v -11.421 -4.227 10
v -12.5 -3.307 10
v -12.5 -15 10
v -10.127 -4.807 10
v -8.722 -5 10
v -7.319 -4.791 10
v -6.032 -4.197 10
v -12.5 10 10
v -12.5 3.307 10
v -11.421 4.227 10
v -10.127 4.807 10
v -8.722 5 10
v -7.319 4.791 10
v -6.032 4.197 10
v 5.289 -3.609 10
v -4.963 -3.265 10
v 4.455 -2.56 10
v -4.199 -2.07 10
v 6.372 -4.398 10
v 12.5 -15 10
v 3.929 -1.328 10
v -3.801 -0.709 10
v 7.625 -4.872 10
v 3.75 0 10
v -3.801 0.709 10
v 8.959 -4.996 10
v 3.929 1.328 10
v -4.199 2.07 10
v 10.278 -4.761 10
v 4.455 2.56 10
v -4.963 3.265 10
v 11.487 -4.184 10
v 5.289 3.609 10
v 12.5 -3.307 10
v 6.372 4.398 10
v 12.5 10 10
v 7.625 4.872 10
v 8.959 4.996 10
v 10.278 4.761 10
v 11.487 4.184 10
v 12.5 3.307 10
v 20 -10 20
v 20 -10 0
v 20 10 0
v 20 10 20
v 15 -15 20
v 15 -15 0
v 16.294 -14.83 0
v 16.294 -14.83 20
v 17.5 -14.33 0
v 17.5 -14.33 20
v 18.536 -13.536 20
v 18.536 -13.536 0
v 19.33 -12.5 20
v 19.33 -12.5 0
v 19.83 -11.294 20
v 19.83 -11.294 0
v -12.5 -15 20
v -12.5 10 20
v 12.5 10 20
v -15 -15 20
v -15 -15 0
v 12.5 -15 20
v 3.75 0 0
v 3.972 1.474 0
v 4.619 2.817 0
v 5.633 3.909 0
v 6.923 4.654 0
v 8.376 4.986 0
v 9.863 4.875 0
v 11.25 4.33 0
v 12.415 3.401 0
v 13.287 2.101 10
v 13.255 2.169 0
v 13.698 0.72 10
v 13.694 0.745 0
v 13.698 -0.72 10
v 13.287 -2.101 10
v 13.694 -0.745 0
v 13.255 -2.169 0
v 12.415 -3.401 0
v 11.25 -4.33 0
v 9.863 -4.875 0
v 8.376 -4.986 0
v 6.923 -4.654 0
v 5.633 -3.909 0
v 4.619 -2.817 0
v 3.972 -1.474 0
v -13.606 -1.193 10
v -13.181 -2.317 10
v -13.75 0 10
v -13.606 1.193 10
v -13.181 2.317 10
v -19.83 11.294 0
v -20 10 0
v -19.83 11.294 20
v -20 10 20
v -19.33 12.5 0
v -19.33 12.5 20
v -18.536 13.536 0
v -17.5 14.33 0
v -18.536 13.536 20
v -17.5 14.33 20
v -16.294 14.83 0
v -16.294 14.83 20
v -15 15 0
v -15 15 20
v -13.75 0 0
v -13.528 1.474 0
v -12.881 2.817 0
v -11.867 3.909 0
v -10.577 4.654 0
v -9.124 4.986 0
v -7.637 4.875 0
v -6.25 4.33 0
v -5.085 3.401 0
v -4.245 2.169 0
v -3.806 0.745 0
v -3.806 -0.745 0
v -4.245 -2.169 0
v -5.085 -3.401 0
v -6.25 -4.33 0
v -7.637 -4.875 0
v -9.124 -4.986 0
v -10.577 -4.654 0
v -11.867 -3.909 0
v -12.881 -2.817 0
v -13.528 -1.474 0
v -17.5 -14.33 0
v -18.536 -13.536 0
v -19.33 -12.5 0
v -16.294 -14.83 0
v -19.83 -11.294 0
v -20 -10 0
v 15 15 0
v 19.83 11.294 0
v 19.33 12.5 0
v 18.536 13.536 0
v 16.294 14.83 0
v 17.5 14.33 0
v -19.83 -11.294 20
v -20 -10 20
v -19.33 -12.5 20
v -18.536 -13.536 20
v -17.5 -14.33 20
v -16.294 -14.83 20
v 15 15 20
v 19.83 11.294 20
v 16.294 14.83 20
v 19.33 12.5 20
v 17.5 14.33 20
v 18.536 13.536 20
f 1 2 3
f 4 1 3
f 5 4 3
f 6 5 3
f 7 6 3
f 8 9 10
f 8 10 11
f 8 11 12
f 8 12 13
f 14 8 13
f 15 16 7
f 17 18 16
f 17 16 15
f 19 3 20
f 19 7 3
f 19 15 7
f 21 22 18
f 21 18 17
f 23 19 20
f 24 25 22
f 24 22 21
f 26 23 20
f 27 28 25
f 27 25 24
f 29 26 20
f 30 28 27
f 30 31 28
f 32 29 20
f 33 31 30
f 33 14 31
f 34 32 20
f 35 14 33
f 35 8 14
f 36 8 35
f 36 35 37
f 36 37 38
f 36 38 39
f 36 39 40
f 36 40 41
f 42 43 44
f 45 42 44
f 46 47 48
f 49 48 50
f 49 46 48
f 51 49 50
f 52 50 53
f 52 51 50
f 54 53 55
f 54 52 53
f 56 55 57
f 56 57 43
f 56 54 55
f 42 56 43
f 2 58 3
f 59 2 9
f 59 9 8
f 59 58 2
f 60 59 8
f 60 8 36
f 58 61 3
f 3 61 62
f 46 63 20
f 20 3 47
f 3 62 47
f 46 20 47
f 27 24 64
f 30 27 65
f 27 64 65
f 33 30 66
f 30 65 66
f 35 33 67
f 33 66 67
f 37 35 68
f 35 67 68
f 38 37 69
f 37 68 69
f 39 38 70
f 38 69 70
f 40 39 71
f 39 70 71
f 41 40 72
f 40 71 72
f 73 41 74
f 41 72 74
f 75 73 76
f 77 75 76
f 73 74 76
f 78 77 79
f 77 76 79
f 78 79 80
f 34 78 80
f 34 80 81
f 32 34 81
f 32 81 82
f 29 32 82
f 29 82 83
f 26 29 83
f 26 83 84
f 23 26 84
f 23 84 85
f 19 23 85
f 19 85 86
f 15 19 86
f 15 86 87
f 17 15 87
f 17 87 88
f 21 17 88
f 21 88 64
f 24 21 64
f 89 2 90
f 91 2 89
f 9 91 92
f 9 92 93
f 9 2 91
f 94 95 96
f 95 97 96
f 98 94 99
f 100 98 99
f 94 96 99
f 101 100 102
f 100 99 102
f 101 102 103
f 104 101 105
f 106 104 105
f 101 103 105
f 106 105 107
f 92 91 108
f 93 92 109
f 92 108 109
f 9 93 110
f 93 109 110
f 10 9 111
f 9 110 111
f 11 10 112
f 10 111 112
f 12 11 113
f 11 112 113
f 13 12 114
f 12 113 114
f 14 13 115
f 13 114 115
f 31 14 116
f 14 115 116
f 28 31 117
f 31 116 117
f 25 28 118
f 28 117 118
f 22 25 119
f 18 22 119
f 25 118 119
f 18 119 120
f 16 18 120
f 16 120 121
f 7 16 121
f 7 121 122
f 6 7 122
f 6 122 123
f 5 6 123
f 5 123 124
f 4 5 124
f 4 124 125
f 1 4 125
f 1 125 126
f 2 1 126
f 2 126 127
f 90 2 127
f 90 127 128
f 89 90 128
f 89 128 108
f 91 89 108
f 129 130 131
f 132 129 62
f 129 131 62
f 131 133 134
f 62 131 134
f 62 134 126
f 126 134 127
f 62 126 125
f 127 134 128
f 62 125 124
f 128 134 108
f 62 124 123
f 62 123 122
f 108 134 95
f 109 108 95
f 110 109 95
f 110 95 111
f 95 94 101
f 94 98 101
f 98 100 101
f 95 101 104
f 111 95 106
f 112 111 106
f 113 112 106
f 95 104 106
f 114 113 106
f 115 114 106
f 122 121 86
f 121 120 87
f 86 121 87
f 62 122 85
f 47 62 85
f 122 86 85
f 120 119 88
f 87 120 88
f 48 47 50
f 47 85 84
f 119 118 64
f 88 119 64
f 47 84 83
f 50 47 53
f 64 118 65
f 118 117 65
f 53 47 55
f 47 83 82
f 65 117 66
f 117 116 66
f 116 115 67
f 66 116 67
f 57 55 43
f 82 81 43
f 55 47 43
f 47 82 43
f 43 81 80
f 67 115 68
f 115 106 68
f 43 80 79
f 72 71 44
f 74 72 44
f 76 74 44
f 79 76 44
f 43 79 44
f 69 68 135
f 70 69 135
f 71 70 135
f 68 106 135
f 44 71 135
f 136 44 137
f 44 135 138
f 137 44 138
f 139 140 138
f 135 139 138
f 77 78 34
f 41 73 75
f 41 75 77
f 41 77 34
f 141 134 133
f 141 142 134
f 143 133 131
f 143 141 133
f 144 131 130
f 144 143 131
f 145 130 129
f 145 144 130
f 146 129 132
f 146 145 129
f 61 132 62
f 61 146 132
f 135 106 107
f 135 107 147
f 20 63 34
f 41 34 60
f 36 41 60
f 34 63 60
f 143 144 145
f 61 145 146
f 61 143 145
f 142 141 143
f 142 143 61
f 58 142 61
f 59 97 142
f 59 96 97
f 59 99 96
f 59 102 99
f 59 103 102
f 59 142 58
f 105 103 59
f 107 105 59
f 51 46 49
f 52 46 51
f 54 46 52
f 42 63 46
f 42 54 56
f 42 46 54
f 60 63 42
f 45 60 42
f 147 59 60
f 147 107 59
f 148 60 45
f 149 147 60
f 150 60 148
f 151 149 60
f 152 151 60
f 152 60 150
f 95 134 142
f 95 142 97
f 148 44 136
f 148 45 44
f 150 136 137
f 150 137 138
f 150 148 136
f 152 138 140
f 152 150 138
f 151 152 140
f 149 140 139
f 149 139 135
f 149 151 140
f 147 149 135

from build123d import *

# Parameters (mm, degrees)
SKETCH1_W           = 40
SKETCH1_H           = 30
BOSS_EXTRUDE1_DEPTH = 20
FILLET1_R           = 5
SKETCH2_R           = 5
CUT_EXTRUDE1_DEPTH  = 10
SKETCH3_W           = 25
SKETCH3_H           = 25
CUT_EXTRUDE2_DEPTH  = 10


with BuildPart() as part:
    # Sketch1 → Boss-Extrude1 (new body)
    with BuildSketch(Plane.XY):
        Rectangle(SKETCH1_W, SKETCH1_H)
    extrude(amount=BOSS_EXTRUDE1_DEPTH)

    # Fillet1
    fillet1_edges = [part.edges().sort_by_distance(p)[0] for p in [
        (20, -15, 10),
        (-20, -15, 10),
        (-20, 15, 10),
        (20, 15, 10),
    ]]
    fillet(fillet1_edges, radius=FILLET1_R)

    # Sketch2 → Cut-Extrude1 (cut)
    with BuildSketch(Plane(origin=(0, 0, 0), x_dir=(-1, 0, 0), z_dir=(0, 0, -1))):
        with Locations((-8.75, 0)):
            Circle(SKETCH2_R)
        with Locations((8.75, 0)):
            Circle(SKETCH2_R)
    extrude(amount=-CUT_EXTRUDE1_DEPTH, mode=Mode.SUBTRACT)

    # Sketch3 → Cut-Extrude2 (cut)
    with BuildSketch(Plane.XY.offset(20)):
        with Locations((0, -2.5)):
            Rectangle(SKETCH3_W, SKETCH3_H)
    extrude(amount=-CUT_EXTRUDE2_DEPTH, mode=Mode.SUBTRACT)


solid = part.part
